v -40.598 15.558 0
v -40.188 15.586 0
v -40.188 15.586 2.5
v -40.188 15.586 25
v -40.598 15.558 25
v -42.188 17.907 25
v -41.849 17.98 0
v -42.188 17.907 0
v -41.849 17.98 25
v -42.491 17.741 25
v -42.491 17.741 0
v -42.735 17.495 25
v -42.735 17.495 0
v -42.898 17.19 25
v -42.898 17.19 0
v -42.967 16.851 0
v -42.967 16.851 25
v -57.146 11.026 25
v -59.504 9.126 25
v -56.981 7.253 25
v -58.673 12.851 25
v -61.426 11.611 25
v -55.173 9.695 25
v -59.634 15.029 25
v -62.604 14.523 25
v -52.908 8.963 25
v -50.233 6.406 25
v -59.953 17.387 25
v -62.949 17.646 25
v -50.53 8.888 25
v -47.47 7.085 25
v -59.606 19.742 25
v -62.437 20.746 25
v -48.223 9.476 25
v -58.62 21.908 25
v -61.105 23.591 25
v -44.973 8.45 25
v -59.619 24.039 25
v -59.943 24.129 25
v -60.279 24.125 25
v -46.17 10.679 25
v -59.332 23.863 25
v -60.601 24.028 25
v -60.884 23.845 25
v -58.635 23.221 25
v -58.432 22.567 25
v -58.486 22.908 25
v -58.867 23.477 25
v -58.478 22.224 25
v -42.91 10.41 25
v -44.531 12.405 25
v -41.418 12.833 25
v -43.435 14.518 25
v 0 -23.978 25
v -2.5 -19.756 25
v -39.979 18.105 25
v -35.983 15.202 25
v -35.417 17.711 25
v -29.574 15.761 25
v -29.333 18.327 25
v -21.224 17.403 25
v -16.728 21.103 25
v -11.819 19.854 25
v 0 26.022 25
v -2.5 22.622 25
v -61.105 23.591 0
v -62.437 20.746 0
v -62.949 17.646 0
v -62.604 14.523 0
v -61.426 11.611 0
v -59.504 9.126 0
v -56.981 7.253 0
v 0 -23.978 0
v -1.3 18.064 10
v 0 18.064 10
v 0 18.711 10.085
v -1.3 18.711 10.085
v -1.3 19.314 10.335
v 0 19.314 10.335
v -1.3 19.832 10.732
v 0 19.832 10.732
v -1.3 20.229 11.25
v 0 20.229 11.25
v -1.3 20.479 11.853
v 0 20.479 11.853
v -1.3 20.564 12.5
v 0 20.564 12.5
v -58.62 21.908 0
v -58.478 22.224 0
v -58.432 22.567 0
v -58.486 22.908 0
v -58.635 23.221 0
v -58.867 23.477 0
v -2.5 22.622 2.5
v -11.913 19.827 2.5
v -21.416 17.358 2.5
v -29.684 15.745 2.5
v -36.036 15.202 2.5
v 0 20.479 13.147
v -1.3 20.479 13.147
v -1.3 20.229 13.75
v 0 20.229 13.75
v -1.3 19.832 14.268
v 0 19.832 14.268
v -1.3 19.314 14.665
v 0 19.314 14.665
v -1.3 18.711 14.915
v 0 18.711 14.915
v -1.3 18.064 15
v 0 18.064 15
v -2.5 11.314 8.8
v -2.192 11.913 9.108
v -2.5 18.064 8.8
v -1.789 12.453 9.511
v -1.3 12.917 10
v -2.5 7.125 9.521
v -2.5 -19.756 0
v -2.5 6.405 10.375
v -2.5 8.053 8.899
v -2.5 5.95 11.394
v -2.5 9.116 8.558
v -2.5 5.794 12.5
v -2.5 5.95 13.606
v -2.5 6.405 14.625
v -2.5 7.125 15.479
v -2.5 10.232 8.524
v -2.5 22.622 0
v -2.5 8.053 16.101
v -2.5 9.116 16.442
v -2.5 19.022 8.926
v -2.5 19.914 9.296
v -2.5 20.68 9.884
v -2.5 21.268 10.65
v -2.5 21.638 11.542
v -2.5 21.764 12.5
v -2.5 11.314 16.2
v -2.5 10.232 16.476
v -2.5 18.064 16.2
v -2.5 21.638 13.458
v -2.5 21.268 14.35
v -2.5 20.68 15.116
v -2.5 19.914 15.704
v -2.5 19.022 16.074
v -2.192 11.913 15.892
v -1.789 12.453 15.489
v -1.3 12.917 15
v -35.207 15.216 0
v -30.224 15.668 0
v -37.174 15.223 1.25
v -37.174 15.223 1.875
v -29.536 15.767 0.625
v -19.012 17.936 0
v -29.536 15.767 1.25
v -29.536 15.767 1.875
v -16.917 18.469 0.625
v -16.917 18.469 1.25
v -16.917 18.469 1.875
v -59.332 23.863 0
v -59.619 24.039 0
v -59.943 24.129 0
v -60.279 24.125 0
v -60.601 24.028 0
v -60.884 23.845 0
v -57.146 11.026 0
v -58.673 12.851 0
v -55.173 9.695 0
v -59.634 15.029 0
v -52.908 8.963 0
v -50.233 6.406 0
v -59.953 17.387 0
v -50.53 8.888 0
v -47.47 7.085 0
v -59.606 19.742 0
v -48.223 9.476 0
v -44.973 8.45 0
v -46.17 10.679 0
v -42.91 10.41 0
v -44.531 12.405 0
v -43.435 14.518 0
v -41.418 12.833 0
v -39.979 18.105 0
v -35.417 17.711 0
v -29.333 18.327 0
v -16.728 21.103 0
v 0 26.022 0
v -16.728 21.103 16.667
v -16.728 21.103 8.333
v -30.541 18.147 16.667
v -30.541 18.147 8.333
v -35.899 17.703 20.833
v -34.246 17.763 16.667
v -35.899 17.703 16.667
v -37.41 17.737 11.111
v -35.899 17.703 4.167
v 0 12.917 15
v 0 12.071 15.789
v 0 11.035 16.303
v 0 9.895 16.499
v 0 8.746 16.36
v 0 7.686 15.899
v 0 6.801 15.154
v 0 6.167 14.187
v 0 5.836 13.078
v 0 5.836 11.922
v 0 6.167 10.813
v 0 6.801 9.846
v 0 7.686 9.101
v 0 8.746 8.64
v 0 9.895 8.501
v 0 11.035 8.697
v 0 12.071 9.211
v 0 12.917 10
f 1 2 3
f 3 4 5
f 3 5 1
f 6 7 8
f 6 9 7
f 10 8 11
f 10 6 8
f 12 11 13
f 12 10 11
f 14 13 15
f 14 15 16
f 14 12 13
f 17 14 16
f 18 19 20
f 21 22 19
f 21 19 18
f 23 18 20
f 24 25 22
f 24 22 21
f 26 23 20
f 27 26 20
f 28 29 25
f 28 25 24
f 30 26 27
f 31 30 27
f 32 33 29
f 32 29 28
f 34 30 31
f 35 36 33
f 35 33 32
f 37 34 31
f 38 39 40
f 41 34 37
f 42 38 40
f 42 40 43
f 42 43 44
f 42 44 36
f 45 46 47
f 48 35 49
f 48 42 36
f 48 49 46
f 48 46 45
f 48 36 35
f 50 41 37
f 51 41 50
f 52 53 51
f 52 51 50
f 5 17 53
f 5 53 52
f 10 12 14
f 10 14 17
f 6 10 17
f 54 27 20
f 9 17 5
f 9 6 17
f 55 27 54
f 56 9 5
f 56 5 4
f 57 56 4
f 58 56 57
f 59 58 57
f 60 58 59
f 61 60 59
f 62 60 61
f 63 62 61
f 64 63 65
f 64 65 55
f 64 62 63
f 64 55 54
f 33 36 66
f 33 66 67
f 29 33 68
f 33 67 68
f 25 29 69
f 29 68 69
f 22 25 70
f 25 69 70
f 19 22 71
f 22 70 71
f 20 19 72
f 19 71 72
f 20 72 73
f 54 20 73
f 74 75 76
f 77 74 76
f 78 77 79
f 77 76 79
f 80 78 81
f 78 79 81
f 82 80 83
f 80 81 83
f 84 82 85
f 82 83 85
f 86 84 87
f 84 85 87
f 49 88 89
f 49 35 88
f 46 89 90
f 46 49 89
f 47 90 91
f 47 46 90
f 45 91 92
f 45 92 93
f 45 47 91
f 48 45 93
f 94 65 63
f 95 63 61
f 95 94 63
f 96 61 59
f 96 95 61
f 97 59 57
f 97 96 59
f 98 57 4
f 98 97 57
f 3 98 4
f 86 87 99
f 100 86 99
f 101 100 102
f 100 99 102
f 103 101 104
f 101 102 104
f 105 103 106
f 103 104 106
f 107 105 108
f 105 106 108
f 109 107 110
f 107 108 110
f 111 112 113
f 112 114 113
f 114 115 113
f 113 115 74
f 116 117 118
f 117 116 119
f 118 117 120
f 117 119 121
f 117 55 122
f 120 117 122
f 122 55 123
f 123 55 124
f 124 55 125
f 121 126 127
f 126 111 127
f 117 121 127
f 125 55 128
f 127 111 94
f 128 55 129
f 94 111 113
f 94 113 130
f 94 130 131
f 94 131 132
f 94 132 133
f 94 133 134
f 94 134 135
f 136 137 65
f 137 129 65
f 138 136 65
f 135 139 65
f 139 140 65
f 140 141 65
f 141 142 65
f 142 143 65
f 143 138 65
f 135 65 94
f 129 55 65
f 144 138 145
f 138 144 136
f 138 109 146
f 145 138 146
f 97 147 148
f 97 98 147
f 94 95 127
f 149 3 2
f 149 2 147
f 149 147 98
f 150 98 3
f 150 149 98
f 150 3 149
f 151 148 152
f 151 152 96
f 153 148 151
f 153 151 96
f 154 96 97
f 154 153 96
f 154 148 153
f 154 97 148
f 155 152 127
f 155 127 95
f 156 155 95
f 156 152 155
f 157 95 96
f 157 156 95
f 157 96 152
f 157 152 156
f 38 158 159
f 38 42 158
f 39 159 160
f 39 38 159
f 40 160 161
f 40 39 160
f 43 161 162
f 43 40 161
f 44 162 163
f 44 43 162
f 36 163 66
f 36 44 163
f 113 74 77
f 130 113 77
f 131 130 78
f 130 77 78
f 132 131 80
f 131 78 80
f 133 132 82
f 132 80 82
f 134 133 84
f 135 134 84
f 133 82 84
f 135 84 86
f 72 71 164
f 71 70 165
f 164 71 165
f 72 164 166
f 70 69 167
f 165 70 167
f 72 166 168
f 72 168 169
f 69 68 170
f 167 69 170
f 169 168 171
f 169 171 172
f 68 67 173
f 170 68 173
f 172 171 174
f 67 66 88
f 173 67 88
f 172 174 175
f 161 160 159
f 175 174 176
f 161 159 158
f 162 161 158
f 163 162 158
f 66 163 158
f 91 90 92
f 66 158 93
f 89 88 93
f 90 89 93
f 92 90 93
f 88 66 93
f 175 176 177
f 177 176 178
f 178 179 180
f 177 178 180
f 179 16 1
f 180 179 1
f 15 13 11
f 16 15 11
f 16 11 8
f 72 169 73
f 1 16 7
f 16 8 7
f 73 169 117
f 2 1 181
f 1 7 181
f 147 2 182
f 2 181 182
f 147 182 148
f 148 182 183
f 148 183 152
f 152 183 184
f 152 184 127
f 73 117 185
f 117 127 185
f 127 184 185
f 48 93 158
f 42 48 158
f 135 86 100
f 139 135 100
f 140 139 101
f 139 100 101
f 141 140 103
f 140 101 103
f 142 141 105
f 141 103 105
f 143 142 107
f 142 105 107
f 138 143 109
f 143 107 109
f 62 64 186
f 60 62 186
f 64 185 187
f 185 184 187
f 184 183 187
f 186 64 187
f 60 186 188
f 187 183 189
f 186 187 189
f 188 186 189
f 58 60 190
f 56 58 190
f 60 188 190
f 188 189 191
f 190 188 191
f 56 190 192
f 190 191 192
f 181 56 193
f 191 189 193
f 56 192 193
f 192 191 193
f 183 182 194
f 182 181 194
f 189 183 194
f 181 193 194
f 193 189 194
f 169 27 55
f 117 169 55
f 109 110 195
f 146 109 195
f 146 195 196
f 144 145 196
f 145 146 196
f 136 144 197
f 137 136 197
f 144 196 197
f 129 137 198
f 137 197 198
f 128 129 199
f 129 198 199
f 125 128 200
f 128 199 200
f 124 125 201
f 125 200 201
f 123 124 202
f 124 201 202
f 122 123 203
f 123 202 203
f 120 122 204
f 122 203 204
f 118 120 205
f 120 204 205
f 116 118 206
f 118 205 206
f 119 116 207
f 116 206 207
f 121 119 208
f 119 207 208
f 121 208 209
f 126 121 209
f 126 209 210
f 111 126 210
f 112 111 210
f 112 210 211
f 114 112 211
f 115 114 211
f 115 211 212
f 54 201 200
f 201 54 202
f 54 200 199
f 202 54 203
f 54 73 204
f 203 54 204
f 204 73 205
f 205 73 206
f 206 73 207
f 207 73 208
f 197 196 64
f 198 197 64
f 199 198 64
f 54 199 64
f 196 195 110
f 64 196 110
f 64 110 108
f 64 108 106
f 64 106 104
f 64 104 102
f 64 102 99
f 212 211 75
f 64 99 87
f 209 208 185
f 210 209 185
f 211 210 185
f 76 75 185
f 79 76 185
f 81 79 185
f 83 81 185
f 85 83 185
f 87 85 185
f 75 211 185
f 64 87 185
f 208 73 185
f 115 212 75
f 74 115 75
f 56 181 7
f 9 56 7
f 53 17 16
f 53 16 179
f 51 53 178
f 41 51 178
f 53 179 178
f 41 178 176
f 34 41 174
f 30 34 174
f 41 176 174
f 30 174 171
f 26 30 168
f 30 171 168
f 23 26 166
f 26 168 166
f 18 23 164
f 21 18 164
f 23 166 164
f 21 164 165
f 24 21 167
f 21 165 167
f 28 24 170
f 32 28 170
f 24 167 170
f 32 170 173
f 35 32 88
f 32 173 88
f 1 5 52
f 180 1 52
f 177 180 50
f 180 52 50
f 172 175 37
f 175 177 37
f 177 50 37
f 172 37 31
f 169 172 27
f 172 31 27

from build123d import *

# Parameters (mm, degrees)
F1_DEPTH = 25
F2_R     = 1.2
F3_T     = -2.5
F4_DEPTH = 25
F6_DEPTH = 3
F7_SIZE  = 1.2


with BuildPart() as f1:
    # F0 (on Top) → F1 (new body)
    with BuildSketch(Plane.XY):
        with BuildLine():
            Line((0, -23.9775525033), (0, 0))
            Line((0, 0), (0, 26.0224474967))
            add(Edge.make_bspline(
                [(0, 26.0224474967), (-17.6971325381, 20.4363816506), (-33.2169395037, 16.3747998881), (-39.9791178567, 18.1051199008)],
                knots=[0, 0, 0, 0, 0.723504363, 0.723504363, 0.723504363, 0.723504363], degree=3))
            ThreePointArc((-39.9791178567, 18.1051199008), (-45.2661850168, 7.6441593667), (-56.9807893445, 7.2532375123))
            Line((-56.9807893445, 7.2532375123), (0, -23.9775525033))
        make_face()
        with BuildLine():
            ThreePointArc((-56.9807893445, 7.2532375123), (-45.2661850168, 7.6441593667), (-39.9791178567, 18.1051199008))
            Line((-39.9791178567, 18.1051199008), (-42.9724328811, 17.9049570556))
            ThreePointArc((-42.9724328811, 17.9049570556), (-54.0664587009, 9.2494171829), (-57.9998429251, 22.7595714353))
            Line((-57.9998429251, 22.7595714353), (-60.310319681, 24.6731275909))
            ThreePointArc((-60.310319681, 24.6731275909), (-62.749017961, 15.17887186), (-56.9807893445, 7.2532375123))
        make_face()
    extrude(amount=F1_DEPTH)

    # F2
    f2_edges = [f1.edges().sort_by_distance(p)[0] for p in [
        (-57.999843, 22.759571, 12.5),
        (-60.31032, 24.673128, 12.5),
        (-42.972433, 17.904957, 12.5),
    ]]
    fillet(f2_edges, radius=F2_R)

    # F3
    f3_openings = [f1.faces().sort_by_distance(p)[0] for p in [
        (-21.146453, 4.166771, 25),
    ]]
    offset(amount=F3_T, openings=f3_openings)

    # F4 (cut): a face of the model
    f4_faces = [f1.faces().sort_by_distance(p)[0] for p in [
        (-19.3393150943, 3.8306877566, 2.5),
    ]]
    extrude(f4_faces, amount=-F4_DEPTH, mode=Mode.SUBTRACT)

    # F5 (on face) → F6 (cut)
    with BuildSketch(Plane.YZ):
        with BuildLine():
            ThreePointArc((12.9166145043, 10), (13.5683701333, 11.1752351146), (13.7941155051, 12.5))
            ThreePointArc((13.7941155051, 12.5), (13.5683701333, 13.8247648854), (12.9166145043, 15))
            ThreePointArc((12.9166145043, 15), (5.7941155051, 12.5), (12.9166145043, 10))
        make_face()
        with BuildLine():
            ThreePointArc((20.5641841143, 12.5), (19.8319510673, 14.267766953), (18.0641841143, 15))
            ThreePointArc((18.0641841143, 15), (15.5641841143, 12.5), (18.0641841143, 10))
            ThreePointArc((18.0641841143, 10), (19.8319510673, 10.732233047), (20.5641841143, 12.5))
        make_face()
        with BuildLine():
            ThreePointArc((12.9166145043, 15), (13.5683701333, 13.8247648854), (13.7941155051, 12.5))
            ThreePointArc((13.7941155051, 12.5), (13.5683701333, 11.1752351146), (12.9166145043, 10))
            Line((12.9166145043, 10), (18.0641841143, 10))
            ThreePointArc((18.0641841143, 10), (15.5641841143, 12.5), (18.0641841143, 15))
            Line((18.0641841143, 15), (12.9166145043, 15))
        make_face()
    extrude(amount=-F6_DEPTH, mode=Mode.SUBTRACT)

    # F7
    f7_edges = [f1.edges().sort_by_distance(p)[0] for p in [
        (-2.5, 15.490399, 10),
        (-2.5, 15.490399, 15),
        (-2.5, 20.564184, 12.5),
    ]]
    chamfer(f7_edges, length=F7_SIZE)


solid = f1.part
